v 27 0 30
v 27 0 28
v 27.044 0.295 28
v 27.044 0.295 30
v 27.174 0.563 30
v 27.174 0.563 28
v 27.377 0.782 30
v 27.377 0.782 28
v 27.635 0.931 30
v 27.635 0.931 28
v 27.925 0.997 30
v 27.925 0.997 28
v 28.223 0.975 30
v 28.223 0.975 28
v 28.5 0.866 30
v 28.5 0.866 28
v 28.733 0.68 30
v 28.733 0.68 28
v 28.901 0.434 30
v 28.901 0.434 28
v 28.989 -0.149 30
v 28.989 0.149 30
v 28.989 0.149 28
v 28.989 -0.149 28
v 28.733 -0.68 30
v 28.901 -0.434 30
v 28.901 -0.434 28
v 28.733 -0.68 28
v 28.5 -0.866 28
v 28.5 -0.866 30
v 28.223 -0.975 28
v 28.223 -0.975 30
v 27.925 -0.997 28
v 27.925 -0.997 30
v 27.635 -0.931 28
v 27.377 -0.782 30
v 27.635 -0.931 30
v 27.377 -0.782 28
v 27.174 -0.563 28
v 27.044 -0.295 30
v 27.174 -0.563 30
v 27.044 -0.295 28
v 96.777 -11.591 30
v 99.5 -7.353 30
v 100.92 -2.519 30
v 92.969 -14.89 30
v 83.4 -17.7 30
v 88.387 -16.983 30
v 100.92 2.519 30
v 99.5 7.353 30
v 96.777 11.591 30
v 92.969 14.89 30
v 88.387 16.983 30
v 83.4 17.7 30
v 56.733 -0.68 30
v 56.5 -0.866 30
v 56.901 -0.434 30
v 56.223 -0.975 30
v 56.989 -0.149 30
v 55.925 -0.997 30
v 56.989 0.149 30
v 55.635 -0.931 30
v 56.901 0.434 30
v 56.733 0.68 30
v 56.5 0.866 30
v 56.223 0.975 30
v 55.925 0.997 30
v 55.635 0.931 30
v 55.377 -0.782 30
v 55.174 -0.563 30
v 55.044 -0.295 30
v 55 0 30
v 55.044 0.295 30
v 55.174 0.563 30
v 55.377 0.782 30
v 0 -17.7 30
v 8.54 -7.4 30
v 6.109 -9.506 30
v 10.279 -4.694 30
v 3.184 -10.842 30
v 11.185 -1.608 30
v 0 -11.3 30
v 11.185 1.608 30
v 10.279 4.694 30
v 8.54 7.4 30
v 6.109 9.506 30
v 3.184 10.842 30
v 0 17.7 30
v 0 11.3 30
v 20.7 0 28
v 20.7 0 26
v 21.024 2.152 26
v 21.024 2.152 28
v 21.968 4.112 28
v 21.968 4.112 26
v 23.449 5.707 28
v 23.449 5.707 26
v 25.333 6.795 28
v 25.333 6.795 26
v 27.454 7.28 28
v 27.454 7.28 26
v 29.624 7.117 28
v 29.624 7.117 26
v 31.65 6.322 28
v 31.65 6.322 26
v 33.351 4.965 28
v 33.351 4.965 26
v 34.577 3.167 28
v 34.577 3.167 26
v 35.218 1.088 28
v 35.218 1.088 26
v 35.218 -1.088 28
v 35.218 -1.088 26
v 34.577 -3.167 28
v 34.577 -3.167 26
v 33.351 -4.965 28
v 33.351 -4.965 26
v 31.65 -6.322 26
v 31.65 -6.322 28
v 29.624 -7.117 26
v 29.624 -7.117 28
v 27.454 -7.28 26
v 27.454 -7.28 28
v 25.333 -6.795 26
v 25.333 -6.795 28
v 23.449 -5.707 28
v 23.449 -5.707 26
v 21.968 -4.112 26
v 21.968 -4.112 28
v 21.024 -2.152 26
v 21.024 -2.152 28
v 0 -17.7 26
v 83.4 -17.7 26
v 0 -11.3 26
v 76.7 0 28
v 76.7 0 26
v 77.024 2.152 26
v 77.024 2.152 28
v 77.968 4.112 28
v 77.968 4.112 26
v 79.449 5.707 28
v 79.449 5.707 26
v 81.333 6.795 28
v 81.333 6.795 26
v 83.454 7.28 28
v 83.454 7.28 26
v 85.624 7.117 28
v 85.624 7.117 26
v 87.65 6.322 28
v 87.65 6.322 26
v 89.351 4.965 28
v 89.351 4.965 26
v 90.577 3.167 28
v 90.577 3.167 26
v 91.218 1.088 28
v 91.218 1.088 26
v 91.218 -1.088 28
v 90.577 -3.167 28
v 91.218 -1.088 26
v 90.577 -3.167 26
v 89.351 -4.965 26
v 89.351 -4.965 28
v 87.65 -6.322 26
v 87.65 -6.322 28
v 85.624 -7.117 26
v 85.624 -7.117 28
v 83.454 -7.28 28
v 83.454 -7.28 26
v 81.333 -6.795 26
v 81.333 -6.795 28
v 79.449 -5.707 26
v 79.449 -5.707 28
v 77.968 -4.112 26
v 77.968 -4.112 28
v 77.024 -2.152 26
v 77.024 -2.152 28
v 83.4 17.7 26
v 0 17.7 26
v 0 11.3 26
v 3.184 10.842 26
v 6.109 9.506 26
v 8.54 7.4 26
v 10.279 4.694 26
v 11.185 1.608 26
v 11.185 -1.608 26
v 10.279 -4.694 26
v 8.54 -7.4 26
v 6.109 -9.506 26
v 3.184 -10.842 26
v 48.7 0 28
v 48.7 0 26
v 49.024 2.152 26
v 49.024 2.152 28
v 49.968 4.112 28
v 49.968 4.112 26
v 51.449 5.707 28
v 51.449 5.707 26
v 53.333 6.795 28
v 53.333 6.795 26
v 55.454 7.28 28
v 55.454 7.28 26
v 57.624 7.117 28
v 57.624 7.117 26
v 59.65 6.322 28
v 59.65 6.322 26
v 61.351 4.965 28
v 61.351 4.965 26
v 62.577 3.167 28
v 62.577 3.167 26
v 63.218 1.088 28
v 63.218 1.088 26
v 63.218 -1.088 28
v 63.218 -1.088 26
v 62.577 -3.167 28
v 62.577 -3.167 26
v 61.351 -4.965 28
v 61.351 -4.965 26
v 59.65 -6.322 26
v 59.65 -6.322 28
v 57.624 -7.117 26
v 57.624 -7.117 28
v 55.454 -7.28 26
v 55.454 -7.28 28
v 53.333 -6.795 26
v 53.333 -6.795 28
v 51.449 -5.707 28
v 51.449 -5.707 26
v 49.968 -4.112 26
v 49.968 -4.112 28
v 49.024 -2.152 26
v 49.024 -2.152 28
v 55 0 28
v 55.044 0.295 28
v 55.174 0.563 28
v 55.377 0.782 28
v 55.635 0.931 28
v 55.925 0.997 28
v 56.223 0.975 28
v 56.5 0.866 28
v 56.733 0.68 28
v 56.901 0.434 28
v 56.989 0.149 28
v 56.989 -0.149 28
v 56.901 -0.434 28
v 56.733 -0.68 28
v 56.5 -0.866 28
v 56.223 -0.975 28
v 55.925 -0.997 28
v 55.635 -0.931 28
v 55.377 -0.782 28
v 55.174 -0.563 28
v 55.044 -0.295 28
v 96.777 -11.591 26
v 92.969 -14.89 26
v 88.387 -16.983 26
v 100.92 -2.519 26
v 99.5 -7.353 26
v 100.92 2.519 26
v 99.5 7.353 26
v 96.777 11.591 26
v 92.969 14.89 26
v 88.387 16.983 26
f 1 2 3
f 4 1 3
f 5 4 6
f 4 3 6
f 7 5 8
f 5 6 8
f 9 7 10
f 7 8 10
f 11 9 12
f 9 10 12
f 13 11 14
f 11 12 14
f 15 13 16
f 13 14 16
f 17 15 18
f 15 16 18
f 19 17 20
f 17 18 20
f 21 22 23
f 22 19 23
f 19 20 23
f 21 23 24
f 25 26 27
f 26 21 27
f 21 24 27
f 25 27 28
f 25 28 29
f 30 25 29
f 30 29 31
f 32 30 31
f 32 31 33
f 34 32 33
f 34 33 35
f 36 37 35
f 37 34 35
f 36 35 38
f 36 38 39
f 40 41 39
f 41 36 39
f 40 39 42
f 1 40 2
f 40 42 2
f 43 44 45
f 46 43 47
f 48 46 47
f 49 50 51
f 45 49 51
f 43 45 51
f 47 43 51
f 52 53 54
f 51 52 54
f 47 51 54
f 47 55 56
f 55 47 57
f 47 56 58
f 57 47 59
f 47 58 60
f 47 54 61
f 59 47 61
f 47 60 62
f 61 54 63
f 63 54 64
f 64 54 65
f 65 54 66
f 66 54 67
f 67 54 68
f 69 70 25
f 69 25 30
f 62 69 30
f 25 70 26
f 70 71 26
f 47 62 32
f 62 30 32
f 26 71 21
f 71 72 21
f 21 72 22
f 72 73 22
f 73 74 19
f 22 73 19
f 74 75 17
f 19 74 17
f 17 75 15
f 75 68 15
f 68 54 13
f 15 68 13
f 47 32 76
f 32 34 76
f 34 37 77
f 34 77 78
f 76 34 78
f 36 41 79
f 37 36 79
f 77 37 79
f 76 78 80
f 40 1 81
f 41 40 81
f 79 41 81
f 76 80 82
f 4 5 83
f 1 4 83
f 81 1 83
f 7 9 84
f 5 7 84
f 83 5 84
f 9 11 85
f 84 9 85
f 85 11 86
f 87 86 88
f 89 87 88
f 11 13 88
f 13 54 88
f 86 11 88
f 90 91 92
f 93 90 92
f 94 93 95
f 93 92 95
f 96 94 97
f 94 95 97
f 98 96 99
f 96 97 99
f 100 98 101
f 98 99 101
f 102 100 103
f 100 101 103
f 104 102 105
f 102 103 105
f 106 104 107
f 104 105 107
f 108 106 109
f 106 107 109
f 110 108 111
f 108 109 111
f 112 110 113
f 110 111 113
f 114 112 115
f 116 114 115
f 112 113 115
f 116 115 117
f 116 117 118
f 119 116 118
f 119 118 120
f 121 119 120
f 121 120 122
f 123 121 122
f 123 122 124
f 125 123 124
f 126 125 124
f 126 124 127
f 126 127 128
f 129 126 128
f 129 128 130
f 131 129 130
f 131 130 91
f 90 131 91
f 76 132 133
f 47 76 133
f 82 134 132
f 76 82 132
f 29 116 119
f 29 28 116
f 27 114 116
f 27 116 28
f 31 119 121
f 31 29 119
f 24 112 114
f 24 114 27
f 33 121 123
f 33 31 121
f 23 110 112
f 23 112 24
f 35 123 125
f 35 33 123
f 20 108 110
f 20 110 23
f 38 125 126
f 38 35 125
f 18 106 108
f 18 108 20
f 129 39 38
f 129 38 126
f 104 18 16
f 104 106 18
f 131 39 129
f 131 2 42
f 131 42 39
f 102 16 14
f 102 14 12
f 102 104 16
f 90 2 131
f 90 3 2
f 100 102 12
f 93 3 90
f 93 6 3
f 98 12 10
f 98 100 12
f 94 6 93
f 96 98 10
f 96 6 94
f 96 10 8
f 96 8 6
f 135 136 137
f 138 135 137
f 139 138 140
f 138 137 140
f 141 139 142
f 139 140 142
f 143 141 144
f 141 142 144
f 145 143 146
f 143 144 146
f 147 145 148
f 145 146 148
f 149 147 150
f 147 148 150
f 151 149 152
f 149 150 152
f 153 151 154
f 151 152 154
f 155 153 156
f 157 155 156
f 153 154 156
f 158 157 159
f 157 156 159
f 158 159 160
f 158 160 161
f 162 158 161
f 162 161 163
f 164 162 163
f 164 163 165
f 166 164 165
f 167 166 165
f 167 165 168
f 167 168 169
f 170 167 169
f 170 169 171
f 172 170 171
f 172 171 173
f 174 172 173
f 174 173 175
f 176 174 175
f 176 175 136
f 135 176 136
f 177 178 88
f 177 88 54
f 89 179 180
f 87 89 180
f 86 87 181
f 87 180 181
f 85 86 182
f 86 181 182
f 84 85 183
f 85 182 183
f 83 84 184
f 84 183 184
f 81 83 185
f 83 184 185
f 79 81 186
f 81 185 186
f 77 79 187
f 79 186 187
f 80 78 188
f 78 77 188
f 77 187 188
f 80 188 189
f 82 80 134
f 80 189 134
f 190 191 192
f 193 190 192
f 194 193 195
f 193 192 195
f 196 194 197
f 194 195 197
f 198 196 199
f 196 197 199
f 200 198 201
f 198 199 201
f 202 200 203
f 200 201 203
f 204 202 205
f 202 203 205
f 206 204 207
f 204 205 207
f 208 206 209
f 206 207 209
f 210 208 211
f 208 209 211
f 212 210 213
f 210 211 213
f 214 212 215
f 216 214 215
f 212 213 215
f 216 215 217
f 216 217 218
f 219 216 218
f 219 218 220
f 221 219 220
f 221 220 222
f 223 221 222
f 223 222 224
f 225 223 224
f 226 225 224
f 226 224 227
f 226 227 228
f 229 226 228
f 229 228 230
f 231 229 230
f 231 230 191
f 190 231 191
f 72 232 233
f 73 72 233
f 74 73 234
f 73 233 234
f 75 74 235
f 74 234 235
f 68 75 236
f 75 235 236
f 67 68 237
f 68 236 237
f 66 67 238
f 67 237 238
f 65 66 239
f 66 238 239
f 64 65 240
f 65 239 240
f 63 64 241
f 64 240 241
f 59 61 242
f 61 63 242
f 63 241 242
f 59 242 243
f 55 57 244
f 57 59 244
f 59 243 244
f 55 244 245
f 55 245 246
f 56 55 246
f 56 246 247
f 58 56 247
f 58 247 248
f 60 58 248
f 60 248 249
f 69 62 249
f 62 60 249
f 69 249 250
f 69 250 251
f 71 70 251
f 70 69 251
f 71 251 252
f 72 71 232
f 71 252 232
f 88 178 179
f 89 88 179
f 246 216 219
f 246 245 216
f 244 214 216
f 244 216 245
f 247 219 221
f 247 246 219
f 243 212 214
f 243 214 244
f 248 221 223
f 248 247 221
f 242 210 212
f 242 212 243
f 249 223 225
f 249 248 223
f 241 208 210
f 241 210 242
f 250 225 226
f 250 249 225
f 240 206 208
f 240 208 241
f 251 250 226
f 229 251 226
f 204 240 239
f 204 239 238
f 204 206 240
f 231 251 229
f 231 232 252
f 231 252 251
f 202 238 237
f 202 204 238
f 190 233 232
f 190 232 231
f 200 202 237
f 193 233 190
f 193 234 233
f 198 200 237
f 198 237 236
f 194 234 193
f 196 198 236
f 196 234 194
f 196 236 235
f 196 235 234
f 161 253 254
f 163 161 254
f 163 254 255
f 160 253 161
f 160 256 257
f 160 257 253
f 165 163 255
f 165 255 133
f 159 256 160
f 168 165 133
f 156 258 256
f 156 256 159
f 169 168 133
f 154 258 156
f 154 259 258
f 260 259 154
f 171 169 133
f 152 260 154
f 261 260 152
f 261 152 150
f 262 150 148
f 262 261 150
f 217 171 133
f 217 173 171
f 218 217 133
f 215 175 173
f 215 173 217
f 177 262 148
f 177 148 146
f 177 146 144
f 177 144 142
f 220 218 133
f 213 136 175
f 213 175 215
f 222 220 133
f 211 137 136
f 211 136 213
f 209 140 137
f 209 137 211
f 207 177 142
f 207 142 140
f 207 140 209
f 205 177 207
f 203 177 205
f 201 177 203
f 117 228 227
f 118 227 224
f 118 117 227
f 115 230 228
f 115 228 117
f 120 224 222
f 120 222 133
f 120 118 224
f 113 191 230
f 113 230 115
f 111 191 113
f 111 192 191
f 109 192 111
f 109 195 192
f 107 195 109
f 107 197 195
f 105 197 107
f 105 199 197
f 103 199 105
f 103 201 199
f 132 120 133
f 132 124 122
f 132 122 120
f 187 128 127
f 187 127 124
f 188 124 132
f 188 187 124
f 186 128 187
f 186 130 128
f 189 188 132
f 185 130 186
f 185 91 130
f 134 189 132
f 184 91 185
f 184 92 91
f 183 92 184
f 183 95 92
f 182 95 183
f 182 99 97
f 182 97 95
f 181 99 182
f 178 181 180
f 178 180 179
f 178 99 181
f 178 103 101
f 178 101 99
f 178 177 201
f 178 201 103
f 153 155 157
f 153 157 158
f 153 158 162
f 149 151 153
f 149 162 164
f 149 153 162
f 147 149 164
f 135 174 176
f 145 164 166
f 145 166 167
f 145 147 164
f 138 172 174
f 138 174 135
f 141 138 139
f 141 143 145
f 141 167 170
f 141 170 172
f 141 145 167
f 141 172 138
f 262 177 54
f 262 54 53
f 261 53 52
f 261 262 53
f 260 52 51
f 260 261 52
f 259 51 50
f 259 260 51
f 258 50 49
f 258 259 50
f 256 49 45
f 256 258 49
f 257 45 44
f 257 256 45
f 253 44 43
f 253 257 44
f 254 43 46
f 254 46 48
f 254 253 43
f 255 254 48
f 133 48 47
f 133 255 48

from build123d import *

# Parameters (mm, degrees)
CYLINDER022_R     = 1
CYLINDER022_DEPTH = 10
CYLINDER023_R     = 1
CYLINDER023_DEPTH = 10
CYLINDER021_R     = 11.3
CYLINDER021_DEPTH = 16
CYLINDER020_R     = 7.3
CYLINDER020_DEPTH = 15
CYLINDER007_R     = 7.3
CYLINDER007_DEPTH = 15
CYLINDER019_R     = 7.3
CYLINDER019_DEPTH = 52
PAD002_DEPTH      = 4


with BuildPart() as cilindro007:
    # Cylinder022 → Cylinder022 (new body)
    with BuildSketch(Plane(origin=(-28, 0, -4), x_dir=(1, 0, 0), z_dir=(0, 0, 1))):
        Circle(CYLINDER022_R)
    extrude(amount=CYLINDER022_DEPTH)


with BuildPart() as fusion001013:
    # Cylinder023 → Cylinder023 (new body)
    with BuildSketch(Plane(origin=(-56, 0, -4), x_dir=(1, 0, 0), z_dir=(0, 0, 1))):
        Circle(CYLINDER023_R)
    extrude(amount=CYLINDER023_DEPTH)

    # Fusion001013: union Cilindro007
    add(cilindro007.part)


with BuildPart() as fusion001013_1:
    # Fusion001013 placement: moved
    add(fusion001013.part.moved(Location((0, 0, 27))))


with BuildPart() as eje004:
    # Cylinder021 → Cylinder021 (new body)
    with BuildSketch(Plane.XY.offset(15)):
        Circle(CYLINDER021_R)
    extrude(amount=CYLINDER021_DEPTH)


with BuildPart() as eje003:
    # Cylinder020 → Cylinder020 (new body)
    with BuildSketch(Plane(origin=(-28, 0, 13), x_dir=(1, 0, 0), z_dir=(0, 0, 1))):
        Circle(CYLINDER020_R)
    extrude(amount=CYLINDER020_DEPTH)


with BuildPart() as fusion001011:
    # Cylinder007 → Cylinder007 (new body)
    with BuildSketch(Plane(origin=(-56, 0, 13), x_dir=(1, 0, 0), z_dir=(0, 0, 1))):
        Circle(CYLINDER007_R)
    extrude(amount=CYLINDER007_DEPTH)

    # Fusion001011: union Eje003
    add(eje003.part)


with BuildPart() as eje001:
    # Cylinder019 → Cylinder019 (new body)
    with BuildSketch(Plane(origin=(-84, 0, -24), x_dir=(1, 0, 0), z_dir=(0, 0, 1))):
        Circle(CYLINDER019_R)
    extrude(amount=CYLINDER019_DEPTH)


with BuildPart() as cut010002:
    # Sketch004 → Pad002 (new body)
    with BuildSketch(Plane.XY):
        with BuildLine():
            Line((0, 17.7), (-83.4, 17.7))
            ThreePointArc((-83.4, 17.7), (-101.1, 0), (-83.4, -17.7))
            Line((0, -17.7), (-83.4, -17.7))
            Line((0, 17.7), (0, -17.7))
        make_face()
    extrude(amount=PAD002_DEPTH)


with BuildPart() as cut010002_1:
    # Body005 placement: moved
    add(cut010002.part.moved(Location((0, 0, 26))))

    # Cut: cut Eje001
    add(eje001.part, mode=Mode.SUBTRACT)

    # Cut026: cut Fusion001011
    add(fusion001011.part, mode=Mode.SUBTRACT)

    # Cut027: cut Eje004
    add(eje004.part, mode=Mode.SUBTRACT)

    # Cut010002: cut Fusion001013
    add(fusion001013_1.part, mode=Mode.SUBTRACT)


with BuildPart() as espejo_tapa:
    # Part__Mirroring011: instance of Cut010002
    add(cut010002_1.part.mirror(Plane(origin=(0, 0, 0), x_dir=(0, -1, 0), z_dir=(1, 0, 0))))


solid = espejo_tapa.part
